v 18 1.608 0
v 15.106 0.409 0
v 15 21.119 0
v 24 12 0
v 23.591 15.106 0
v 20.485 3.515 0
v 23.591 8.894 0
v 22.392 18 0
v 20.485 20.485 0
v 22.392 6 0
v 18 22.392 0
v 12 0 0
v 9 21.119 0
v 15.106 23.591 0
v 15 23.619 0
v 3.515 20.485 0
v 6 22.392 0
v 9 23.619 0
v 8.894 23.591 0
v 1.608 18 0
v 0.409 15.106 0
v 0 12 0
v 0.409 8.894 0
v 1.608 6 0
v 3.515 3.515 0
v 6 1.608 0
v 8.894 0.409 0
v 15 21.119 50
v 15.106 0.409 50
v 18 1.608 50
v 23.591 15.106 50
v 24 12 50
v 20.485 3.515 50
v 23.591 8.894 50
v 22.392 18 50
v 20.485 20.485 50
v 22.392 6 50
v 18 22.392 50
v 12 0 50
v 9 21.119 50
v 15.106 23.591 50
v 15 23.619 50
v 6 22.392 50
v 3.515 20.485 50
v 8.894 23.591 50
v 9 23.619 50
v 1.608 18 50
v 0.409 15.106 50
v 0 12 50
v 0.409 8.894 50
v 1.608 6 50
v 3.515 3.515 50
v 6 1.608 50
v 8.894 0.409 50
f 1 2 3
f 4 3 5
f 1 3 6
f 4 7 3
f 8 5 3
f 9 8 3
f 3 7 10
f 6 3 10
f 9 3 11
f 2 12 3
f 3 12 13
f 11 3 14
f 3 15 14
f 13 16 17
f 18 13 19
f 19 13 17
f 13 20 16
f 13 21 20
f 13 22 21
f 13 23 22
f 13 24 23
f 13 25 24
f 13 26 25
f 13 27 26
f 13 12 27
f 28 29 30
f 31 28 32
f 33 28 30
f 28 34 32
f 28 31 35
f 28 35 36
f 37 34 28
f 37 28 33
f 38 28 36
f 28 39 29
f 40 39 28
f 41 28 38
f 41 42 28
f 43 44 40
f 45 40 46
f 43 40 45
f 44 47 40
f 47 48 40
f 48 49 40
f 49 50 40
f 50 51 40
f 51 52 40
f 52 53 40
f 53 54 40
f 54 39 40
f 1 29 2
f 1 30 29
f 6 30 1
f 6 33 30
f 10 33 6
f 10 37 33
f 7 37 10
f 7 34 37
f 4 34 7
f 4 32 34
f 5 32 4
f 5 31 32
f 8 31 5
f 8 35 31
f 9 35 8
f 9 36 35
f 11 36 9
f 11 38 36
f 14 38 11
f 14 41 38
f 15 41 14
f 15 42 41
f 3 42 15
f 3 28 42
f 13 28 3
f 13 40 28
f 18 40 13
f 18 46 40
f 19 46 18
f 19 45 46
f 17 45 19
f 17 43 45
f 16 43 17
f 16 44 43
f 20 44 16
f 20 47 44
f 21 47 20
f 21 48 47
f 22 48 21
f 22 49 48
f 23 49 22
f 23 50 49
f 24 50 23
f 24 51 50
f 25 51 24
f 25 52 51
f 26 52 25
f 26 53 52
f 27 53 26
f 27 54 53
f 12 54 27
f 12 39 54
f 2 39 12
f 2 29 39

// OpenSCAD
$fn = 32;

// ----------------------------------------------------------------------
// Keyway shaft: d24 shaft, key 6 x 2.5 mm
// ----------------------------------------------------------------------

// --- parameters (mm) ---
shaft_r = 12;             // shaft radius
key_w = 6;                // keyway width
key_d = 2.5;              // keyway depth below the surface line
plate_t = 50;             // shaft length, Z (extrusion height)

shaft_d = 2 * shaft_r;  // shaft diameter
circle_step = 15;  // polygon sampling step, degrees

profile = [[8.894, 23.591], [6, 22.392], [3.515, 20.485], [1.608, 18], [0.409, 15.106], [0, 12], [0.409, 8.894], [1.608, 6], [3.515, 3.515], [6, 1.608], [8.894, 0.409], [12, 0], [15.106, 0.409], [18, 1.608], [20.485, 3.515], [22.392, 6], [23.591, 8.894], [24, 12], [23.591, 15.106], [22.392, 18], [20.485, 20.485], [18, 22.392], [15.106, 23.591], [15, 23.619], [15, 21.119], [9, 21.119], [9, 23.619]];  // primary outline, 27 points, counter clockwise

// --- the one profile operation ---
linear_extrude(height = plate_t) polygon(points = profile);
